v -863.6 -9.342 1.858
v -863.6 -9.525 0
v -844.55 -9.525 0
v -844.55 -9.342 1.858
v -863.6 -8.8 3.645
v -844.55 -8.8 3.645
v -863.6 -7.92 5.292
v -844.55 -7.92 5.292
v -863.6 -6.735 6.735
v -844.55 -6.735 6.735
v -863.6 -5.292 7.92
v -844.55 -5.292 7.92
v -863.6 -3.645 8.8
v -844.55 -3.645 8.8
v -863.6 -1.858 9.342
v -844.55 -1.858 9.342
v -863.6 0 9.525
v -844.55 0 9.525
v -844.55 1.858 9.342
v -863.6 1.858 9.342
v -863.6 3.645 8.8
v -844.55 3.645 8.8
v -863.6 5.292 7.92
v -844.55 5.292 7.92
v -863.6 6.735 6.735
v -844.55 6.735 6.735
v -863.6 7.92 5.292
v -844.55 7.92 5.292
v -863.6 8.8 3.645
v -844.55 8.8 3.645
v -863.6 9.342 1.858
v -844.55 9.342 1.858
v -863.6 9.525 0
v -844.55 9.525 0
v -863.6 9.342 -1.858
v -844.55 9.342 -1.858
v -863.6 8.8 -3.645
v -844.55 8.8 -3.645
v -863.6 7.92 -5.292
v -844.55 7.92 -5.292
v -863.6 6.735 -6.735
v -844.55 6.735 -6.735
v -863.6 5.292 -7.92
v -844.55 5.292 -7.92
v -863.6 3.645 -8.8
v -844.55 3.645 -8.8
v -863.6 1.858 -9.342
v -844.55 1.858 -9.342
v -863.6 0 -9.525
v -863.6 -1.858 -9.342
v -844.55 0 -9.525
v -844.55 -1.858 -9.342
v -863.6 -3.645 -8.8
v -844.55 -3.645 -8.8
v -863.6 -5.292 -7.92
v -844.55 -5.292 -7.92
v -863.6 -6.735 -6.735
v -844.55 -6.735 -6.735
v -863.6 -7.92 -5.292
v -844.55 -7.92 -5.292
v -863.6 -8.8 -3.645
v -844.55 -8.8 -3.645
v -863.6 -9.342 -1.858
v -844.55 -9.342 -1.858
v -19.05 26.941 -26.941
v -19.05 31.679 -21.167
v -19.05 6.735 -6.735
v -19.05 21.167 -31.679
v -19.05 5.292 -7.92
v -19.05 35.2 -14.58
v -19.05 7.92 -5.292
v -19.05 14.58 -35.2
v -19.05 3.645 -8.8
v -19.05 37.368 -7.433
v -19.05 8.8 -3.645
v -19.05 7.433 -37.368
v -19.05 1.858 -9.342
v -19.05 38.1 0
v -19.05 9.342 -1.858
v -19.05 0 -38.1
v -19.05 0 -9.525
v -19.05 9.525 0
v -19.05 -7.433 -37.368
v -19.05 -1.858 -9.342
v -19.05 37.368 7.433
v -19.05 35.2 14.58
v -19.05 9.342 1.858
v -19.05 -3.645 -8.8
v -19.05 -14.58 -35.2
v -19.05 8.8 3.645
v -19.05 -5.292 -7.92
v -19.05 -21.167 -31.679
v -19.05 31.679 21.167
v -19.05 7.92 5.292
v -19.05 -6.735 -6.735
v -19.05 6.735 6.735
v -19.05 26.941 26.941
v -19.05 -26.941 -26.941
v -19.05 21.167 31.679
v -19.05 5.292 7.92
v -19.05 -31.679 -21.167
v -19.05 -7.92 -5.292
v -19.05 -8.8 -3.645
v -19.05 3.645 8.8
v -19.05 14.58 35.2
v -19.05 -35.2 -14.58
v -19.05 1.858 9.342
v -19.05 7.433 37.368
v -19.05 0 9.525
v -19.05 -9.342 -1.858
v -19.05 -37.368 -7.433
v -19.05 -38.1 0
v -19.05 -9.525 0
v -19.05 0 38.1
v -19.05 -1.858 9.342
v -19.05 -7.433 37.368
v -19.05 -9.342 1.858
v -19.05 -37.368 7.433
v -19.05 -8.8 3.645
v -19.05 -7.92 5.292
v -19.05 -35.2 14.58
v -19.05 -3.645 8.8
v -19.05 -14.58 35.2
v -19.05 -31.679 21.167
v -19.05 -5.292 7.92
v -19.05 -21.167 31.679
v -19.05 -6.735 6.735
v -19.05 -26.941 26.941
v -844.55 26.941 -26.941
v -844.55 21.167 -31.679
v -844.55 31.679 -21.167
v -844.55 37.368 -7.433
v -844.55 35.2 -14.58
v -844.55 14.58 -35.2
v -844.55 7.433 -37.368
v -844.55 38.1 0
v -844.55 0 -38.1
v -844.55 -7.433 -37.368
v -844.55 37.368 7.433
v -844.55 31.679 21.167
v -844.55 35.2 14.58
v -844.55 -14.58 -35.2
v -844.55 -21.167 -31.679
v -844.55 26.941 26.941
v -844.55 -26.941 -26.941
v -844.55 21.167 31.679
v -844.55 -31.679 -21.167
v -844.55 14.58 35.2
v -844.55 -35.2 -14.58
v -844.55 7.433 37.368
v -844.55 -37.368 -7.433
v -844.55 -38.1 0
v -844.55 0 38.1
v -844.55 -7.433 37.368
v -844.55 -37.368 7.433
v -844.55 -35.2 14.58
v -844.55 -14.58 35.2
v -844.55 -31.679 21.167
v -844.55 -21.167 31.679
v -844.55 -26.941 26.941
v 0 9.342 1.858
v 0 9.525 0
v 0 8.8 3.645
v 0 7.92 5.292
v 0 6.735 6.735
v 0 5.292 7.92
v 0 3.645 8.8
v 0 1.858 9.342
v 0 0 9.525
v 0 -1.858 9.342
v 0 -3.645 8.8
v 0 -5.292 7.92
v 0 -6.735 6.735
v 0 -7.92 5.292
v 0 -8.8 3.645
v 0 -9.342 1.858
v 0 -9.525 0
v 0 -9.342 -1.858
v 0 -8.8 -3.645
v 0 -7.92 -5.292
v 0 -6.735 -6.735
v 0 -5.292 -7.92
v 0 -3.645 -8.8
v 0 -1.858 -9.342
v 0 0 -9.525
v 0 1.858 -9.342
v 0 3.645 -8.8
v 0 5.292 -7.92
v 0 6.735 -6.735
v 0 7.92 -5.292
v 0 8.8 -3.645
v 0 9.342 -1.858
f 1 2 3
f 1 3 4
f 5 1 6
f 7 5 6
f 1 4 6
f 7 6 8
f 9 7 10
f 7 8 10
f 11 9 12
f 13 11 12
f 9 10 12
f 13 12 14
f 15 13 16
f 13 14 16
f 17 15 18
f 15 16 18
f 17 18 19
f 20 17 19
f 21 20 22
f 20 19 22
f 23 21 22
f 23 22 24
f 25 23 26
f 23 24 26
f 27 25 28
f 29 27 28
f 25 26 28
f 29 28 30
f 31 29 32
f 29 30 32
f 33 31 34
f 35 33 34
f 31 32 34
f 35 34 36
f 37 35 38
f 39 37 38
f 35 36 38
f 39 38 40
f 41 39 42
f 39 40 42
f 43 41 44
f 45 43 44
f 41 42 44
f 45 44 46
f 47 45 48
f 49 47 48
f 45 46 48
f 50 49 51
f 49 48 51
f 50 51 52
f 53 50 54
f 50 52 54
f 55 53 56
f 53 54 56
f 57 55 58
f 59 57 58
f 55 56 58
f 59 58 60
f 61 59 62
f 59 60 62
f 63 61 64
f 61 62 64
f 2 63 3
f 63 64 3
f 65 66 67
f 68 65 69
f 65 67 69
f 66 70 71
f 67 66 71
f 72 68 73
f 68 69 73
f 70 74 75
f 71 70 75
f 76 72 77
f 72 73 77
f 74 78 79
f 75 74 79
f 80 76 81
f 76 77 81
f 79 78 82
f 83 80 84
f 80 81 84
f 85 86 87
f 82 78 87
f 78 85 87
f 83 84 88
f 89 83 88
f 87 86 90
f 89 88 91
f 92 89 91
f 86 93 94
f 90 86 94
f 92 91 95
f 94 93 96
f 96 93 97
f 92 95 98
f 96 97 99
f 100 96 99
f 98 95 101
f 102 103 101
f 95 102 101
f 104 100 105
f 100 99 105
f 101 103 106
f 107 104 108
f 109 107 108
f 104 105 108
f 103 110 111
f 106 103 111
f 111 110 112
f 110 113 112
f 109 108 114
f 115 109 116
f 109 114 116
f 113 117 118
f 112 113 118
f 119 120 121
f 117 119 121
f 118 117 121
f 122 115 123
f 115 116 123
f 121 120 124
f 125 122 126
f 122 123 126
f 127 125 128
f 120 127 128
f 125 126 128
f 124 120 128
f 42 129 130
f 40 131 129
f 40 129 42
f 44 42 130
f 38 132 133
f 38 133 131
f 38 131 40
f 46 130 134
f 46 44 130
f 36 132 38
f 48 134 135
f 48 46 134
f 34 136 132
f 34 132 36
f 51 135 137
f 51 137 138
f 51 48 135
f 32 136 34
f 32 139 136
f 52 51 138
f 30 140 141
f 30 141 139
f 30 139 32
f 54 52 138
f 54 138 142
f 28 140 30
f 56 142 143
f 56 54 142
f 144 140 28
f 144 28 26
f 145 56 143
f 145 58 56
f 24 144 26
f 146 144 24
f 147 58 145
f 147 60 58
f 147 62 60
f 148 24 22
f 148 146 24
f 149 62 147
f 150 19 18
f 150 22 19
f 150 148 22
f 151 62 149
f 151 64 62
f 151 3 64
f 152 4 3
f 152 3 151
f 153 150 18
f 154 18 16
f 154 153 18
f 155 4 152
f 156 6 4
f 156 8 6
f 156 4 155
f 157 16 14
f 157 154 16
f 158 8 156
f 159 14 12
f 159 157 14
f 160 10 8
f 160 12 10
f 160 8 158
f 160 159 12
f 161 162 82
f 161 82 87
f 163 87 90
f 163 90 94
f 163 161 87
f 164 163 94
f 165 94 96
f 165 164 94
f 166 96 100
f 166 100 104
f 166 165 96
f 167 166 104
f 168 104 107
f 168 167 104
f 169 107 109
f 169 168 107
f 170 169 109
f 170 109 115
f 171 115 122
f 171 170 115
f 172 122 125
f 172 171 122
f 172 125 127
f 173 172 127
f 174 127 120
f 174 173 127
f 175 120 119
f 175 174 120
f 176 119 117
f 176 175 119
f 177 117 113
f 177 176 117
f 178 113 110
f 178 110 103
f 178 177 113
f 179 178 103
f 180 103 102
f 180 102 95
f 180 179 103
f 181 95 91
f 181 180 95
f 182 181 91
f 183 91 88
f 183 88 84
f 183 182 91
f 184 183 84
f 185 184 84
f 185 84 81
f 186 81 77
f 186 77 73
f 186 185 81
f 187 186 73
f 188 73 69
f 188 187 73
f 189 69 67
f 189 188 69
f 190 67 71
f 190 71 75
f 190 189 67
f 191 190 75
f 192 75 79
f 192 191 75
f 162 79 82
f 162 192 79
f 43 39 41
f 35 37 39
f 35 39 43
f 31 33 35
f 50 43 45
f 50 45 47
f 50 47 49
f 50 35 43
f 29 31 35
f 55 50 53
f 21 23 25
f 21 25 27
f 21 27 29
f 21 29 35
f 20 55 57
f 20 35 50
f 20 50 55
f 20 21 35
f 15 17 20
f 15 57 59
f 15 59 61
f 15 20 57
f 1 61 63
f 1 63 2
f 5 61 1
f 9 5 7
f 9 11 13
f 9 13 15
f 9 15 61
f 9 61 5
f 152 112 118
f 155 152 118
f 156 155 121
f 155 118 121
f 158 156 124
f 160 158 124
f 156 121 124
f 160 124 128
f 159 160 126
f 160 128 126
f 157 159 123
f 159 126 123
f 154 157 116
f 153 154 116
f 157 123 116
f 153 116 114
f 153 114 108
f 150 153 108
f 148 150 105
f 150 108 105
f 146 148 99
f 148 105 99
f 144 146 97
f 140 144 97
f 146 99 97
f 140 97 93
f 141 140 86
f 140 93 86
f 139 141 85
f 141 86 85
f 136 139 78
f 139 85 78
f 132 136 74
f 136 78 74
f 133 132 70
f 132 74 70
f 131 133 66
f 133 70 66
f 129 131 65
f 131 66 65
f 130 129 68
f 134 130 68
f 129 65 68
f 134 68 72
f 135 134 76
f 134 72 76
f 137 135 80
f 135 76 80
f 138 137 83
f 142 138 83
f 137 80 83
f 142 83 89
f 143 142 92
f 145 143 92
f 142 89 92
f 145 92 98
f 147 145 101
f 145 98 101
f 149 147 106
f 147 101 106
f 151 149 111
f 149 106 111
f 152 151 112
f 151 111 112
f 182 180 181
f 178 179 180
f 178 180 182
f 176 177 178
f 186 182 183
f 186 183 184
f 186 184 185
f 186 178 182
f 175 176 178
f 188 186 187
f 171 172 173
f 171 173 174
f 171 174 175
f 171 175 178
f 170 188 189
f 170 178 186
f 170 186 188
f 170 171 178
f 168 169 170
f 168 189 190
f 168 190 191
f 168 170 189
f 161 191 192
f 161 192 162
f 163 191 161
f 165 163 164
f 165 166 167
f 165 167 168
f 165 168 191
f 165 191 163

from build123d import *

# Parameters (mm, degrees)
F0_R     = 9.525
F1_DEPTH = 19.05
F2_R     = 38.1
F3_DEPTH = 825.5
F4_R     = 9.525
F5_DEPTH = 19.05


with BuildPart() as f1:
    # F0 (on Right) → F1 (new body)
    with BuildSketch(Plane.YZ):
        Circle(F0_R)
    extrude(amount=-F1_DEPTH)

    # F2 (on face) → F3 (join)
    with BuildSketch(Plane(origin=(-19.05, 0, 0), x_dir=(0, -1, 0), z_dir=(-1, 0, 0))):
        Circle(F2_R)
    extrude(amount=F3_DEPTH)

    # F4 (on face) → F5 (join)
    with BuildSketch(Plane(origin=(-844.55, 0, 0), x_dir=(0, -1, 0), z_dir=(-1, 0, 0))):
        Circle(F4_R)
    extrude(amount=F5_DEPTH)


solid = f1.part
